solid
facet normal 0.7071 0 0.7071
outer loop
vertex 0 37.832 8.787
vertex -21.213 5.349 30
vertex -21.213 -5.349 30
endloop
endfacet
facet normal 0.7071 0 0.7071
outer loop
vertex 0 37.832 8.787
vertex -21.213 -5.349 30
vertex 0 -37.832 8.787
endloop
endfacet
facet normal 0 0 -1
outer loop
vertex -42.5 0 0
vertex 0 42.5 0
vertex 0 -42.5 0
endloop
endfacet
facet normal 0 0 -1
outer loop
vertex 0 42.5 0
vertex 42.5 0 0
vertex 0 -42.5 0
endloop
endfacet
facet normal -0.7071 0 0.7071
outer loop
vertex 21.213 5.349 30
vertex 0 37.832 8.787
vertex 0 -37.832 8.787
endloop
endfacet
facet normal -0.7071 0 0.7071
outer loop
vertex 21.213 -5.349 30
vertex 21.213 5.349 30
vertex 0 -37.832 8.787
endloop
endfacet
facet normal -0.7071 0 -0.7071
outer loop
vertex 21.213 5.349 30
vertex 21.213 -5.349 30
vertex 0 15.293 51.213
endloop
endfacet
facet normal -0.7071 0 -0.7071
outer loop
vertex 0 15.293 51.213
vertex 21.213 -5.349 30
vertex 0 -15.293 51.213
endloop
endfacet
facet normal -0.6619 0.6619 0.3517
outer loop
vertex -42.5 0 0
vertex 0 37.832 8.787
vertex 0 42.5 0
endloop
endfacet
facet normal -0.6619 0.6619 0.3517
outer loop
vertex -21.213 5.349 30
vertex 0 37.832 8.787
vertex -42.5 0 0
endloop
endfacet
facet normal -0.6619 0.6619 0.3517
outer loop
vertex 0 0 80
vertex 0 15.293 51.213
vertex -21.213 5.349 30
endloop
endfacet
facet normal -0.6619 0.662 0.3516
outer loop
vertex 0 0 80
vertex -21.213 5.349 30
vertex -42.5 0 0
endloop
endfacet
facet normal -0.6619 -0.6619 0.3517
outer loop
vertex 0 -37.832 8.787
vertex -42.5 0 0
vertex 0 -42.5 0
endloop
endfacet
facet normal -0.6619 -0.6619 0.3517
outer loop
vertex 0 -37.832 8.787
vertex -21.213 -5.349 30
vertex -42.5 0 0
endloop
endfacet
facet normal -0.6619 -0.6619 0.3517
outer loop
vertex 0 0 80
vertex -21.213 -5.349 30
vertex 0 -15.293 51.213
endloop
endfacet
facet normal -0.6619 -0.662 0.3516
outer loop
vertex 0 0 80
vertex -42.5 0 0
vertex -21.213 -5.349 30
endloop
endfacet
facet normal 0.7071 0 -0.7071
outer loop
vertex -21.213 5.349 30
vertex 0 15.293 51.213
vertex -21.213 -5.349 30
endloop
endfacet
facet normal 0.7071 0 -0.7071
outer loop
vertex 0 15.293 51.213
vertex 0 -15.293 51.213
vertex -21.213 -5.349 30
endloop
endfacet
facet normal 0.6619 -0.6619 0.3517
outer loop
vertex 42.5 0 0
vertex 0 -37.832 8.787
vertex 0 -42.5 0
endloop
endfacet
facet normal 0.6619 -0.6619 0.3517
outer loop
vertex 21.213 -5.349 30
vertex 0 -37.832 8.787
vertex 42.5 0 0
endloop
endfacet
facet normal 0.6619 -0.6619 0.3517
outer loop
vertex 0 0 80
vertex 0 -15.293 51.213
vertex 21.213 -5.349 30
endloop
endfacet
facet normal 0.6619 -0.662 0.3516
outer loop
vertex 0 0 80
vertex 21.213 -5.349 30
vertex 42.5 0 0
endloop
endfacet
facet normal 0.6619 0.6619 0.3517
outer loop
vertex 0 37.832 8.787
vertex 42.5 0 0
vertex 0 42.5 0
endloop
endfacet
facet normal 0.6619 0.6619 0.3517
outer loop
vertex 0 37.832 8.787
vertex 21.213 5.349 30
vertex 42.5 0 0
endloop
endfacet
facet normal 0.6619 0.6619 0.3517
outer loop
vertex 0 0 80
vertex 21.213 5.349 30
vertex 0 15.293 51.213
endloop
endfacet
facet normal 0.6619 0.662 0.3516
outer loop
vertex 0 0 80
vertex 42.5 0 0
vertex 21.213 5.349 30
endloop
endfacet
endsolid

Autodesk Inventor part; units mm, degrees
ref_plane "YZ Plane" through (0, 0, 0) normal (1, 0, 0) x (0, 1, 0)
ref_plane "XZ Plane" through (0, 0, 0) normal (0, 1, 0) x (-1, 0, 0)
sketch "Эскиз1" plane through (0, 0, 0) normal (0, 0, 1) x (1, 0, 0)
  point P0 (0, 0)
sketch "Эскиз2" plane through (0, 0, 0) normal (0, 0, 1) x (1, 0, 0)
  line L0 (0, 42.5) -> (42.5, 0)
  line L1 (42.5, 0) -> (0, -42.5)
  line L2 (0, -42.5) -> (-42.5, 0)
  line L3 (-42.5, 0) -> (0, 42.5)
  point P0 (0, 0)
  point P1 (0, 0)
  dimension "d0" = 85
sketch "Эскиз3" plane through (0, 0, 0) normal (0, 0, 1) x (1, 0, 0)
  point P0 (0, 0)
ref_plane "РабПлоскость1" through (0, 0, 80) normal (0, 0, 1) x (1, 0, 0)
sketch "Эскиз4" plane through (0, 0, 80) normal (0, 0, 1) x (1, 0, 0)
  point P0 (0, 0)
loft "Лофт1" add profiles "Эскиз2" section 2 point at (0, 0, 80)
sketch "Эскиз5" plane through (0, 0, 0) normal (0, 1, 0) x (-1, 0, 0)
  line L0 (0, 8.7868) -> (-21.2132, 30)
  line L1 (-21.2132, 30) -> (0, 51.2132)
  line L2 (0, 51.2132) -> (21.2132, 30)
  line L3 (21.2132, 30) -> (0, 8.7868)
  line L4 (0, 0) -> (42.5, 0) projected
  point P0 (0, 30)
  dimension "d6" = 30
  dimension "d7" = 30
extrude "Выдавливание1" cut sketch "Эскиз5" along normal through all both and the other way through all
properties part number "Пирамида"
